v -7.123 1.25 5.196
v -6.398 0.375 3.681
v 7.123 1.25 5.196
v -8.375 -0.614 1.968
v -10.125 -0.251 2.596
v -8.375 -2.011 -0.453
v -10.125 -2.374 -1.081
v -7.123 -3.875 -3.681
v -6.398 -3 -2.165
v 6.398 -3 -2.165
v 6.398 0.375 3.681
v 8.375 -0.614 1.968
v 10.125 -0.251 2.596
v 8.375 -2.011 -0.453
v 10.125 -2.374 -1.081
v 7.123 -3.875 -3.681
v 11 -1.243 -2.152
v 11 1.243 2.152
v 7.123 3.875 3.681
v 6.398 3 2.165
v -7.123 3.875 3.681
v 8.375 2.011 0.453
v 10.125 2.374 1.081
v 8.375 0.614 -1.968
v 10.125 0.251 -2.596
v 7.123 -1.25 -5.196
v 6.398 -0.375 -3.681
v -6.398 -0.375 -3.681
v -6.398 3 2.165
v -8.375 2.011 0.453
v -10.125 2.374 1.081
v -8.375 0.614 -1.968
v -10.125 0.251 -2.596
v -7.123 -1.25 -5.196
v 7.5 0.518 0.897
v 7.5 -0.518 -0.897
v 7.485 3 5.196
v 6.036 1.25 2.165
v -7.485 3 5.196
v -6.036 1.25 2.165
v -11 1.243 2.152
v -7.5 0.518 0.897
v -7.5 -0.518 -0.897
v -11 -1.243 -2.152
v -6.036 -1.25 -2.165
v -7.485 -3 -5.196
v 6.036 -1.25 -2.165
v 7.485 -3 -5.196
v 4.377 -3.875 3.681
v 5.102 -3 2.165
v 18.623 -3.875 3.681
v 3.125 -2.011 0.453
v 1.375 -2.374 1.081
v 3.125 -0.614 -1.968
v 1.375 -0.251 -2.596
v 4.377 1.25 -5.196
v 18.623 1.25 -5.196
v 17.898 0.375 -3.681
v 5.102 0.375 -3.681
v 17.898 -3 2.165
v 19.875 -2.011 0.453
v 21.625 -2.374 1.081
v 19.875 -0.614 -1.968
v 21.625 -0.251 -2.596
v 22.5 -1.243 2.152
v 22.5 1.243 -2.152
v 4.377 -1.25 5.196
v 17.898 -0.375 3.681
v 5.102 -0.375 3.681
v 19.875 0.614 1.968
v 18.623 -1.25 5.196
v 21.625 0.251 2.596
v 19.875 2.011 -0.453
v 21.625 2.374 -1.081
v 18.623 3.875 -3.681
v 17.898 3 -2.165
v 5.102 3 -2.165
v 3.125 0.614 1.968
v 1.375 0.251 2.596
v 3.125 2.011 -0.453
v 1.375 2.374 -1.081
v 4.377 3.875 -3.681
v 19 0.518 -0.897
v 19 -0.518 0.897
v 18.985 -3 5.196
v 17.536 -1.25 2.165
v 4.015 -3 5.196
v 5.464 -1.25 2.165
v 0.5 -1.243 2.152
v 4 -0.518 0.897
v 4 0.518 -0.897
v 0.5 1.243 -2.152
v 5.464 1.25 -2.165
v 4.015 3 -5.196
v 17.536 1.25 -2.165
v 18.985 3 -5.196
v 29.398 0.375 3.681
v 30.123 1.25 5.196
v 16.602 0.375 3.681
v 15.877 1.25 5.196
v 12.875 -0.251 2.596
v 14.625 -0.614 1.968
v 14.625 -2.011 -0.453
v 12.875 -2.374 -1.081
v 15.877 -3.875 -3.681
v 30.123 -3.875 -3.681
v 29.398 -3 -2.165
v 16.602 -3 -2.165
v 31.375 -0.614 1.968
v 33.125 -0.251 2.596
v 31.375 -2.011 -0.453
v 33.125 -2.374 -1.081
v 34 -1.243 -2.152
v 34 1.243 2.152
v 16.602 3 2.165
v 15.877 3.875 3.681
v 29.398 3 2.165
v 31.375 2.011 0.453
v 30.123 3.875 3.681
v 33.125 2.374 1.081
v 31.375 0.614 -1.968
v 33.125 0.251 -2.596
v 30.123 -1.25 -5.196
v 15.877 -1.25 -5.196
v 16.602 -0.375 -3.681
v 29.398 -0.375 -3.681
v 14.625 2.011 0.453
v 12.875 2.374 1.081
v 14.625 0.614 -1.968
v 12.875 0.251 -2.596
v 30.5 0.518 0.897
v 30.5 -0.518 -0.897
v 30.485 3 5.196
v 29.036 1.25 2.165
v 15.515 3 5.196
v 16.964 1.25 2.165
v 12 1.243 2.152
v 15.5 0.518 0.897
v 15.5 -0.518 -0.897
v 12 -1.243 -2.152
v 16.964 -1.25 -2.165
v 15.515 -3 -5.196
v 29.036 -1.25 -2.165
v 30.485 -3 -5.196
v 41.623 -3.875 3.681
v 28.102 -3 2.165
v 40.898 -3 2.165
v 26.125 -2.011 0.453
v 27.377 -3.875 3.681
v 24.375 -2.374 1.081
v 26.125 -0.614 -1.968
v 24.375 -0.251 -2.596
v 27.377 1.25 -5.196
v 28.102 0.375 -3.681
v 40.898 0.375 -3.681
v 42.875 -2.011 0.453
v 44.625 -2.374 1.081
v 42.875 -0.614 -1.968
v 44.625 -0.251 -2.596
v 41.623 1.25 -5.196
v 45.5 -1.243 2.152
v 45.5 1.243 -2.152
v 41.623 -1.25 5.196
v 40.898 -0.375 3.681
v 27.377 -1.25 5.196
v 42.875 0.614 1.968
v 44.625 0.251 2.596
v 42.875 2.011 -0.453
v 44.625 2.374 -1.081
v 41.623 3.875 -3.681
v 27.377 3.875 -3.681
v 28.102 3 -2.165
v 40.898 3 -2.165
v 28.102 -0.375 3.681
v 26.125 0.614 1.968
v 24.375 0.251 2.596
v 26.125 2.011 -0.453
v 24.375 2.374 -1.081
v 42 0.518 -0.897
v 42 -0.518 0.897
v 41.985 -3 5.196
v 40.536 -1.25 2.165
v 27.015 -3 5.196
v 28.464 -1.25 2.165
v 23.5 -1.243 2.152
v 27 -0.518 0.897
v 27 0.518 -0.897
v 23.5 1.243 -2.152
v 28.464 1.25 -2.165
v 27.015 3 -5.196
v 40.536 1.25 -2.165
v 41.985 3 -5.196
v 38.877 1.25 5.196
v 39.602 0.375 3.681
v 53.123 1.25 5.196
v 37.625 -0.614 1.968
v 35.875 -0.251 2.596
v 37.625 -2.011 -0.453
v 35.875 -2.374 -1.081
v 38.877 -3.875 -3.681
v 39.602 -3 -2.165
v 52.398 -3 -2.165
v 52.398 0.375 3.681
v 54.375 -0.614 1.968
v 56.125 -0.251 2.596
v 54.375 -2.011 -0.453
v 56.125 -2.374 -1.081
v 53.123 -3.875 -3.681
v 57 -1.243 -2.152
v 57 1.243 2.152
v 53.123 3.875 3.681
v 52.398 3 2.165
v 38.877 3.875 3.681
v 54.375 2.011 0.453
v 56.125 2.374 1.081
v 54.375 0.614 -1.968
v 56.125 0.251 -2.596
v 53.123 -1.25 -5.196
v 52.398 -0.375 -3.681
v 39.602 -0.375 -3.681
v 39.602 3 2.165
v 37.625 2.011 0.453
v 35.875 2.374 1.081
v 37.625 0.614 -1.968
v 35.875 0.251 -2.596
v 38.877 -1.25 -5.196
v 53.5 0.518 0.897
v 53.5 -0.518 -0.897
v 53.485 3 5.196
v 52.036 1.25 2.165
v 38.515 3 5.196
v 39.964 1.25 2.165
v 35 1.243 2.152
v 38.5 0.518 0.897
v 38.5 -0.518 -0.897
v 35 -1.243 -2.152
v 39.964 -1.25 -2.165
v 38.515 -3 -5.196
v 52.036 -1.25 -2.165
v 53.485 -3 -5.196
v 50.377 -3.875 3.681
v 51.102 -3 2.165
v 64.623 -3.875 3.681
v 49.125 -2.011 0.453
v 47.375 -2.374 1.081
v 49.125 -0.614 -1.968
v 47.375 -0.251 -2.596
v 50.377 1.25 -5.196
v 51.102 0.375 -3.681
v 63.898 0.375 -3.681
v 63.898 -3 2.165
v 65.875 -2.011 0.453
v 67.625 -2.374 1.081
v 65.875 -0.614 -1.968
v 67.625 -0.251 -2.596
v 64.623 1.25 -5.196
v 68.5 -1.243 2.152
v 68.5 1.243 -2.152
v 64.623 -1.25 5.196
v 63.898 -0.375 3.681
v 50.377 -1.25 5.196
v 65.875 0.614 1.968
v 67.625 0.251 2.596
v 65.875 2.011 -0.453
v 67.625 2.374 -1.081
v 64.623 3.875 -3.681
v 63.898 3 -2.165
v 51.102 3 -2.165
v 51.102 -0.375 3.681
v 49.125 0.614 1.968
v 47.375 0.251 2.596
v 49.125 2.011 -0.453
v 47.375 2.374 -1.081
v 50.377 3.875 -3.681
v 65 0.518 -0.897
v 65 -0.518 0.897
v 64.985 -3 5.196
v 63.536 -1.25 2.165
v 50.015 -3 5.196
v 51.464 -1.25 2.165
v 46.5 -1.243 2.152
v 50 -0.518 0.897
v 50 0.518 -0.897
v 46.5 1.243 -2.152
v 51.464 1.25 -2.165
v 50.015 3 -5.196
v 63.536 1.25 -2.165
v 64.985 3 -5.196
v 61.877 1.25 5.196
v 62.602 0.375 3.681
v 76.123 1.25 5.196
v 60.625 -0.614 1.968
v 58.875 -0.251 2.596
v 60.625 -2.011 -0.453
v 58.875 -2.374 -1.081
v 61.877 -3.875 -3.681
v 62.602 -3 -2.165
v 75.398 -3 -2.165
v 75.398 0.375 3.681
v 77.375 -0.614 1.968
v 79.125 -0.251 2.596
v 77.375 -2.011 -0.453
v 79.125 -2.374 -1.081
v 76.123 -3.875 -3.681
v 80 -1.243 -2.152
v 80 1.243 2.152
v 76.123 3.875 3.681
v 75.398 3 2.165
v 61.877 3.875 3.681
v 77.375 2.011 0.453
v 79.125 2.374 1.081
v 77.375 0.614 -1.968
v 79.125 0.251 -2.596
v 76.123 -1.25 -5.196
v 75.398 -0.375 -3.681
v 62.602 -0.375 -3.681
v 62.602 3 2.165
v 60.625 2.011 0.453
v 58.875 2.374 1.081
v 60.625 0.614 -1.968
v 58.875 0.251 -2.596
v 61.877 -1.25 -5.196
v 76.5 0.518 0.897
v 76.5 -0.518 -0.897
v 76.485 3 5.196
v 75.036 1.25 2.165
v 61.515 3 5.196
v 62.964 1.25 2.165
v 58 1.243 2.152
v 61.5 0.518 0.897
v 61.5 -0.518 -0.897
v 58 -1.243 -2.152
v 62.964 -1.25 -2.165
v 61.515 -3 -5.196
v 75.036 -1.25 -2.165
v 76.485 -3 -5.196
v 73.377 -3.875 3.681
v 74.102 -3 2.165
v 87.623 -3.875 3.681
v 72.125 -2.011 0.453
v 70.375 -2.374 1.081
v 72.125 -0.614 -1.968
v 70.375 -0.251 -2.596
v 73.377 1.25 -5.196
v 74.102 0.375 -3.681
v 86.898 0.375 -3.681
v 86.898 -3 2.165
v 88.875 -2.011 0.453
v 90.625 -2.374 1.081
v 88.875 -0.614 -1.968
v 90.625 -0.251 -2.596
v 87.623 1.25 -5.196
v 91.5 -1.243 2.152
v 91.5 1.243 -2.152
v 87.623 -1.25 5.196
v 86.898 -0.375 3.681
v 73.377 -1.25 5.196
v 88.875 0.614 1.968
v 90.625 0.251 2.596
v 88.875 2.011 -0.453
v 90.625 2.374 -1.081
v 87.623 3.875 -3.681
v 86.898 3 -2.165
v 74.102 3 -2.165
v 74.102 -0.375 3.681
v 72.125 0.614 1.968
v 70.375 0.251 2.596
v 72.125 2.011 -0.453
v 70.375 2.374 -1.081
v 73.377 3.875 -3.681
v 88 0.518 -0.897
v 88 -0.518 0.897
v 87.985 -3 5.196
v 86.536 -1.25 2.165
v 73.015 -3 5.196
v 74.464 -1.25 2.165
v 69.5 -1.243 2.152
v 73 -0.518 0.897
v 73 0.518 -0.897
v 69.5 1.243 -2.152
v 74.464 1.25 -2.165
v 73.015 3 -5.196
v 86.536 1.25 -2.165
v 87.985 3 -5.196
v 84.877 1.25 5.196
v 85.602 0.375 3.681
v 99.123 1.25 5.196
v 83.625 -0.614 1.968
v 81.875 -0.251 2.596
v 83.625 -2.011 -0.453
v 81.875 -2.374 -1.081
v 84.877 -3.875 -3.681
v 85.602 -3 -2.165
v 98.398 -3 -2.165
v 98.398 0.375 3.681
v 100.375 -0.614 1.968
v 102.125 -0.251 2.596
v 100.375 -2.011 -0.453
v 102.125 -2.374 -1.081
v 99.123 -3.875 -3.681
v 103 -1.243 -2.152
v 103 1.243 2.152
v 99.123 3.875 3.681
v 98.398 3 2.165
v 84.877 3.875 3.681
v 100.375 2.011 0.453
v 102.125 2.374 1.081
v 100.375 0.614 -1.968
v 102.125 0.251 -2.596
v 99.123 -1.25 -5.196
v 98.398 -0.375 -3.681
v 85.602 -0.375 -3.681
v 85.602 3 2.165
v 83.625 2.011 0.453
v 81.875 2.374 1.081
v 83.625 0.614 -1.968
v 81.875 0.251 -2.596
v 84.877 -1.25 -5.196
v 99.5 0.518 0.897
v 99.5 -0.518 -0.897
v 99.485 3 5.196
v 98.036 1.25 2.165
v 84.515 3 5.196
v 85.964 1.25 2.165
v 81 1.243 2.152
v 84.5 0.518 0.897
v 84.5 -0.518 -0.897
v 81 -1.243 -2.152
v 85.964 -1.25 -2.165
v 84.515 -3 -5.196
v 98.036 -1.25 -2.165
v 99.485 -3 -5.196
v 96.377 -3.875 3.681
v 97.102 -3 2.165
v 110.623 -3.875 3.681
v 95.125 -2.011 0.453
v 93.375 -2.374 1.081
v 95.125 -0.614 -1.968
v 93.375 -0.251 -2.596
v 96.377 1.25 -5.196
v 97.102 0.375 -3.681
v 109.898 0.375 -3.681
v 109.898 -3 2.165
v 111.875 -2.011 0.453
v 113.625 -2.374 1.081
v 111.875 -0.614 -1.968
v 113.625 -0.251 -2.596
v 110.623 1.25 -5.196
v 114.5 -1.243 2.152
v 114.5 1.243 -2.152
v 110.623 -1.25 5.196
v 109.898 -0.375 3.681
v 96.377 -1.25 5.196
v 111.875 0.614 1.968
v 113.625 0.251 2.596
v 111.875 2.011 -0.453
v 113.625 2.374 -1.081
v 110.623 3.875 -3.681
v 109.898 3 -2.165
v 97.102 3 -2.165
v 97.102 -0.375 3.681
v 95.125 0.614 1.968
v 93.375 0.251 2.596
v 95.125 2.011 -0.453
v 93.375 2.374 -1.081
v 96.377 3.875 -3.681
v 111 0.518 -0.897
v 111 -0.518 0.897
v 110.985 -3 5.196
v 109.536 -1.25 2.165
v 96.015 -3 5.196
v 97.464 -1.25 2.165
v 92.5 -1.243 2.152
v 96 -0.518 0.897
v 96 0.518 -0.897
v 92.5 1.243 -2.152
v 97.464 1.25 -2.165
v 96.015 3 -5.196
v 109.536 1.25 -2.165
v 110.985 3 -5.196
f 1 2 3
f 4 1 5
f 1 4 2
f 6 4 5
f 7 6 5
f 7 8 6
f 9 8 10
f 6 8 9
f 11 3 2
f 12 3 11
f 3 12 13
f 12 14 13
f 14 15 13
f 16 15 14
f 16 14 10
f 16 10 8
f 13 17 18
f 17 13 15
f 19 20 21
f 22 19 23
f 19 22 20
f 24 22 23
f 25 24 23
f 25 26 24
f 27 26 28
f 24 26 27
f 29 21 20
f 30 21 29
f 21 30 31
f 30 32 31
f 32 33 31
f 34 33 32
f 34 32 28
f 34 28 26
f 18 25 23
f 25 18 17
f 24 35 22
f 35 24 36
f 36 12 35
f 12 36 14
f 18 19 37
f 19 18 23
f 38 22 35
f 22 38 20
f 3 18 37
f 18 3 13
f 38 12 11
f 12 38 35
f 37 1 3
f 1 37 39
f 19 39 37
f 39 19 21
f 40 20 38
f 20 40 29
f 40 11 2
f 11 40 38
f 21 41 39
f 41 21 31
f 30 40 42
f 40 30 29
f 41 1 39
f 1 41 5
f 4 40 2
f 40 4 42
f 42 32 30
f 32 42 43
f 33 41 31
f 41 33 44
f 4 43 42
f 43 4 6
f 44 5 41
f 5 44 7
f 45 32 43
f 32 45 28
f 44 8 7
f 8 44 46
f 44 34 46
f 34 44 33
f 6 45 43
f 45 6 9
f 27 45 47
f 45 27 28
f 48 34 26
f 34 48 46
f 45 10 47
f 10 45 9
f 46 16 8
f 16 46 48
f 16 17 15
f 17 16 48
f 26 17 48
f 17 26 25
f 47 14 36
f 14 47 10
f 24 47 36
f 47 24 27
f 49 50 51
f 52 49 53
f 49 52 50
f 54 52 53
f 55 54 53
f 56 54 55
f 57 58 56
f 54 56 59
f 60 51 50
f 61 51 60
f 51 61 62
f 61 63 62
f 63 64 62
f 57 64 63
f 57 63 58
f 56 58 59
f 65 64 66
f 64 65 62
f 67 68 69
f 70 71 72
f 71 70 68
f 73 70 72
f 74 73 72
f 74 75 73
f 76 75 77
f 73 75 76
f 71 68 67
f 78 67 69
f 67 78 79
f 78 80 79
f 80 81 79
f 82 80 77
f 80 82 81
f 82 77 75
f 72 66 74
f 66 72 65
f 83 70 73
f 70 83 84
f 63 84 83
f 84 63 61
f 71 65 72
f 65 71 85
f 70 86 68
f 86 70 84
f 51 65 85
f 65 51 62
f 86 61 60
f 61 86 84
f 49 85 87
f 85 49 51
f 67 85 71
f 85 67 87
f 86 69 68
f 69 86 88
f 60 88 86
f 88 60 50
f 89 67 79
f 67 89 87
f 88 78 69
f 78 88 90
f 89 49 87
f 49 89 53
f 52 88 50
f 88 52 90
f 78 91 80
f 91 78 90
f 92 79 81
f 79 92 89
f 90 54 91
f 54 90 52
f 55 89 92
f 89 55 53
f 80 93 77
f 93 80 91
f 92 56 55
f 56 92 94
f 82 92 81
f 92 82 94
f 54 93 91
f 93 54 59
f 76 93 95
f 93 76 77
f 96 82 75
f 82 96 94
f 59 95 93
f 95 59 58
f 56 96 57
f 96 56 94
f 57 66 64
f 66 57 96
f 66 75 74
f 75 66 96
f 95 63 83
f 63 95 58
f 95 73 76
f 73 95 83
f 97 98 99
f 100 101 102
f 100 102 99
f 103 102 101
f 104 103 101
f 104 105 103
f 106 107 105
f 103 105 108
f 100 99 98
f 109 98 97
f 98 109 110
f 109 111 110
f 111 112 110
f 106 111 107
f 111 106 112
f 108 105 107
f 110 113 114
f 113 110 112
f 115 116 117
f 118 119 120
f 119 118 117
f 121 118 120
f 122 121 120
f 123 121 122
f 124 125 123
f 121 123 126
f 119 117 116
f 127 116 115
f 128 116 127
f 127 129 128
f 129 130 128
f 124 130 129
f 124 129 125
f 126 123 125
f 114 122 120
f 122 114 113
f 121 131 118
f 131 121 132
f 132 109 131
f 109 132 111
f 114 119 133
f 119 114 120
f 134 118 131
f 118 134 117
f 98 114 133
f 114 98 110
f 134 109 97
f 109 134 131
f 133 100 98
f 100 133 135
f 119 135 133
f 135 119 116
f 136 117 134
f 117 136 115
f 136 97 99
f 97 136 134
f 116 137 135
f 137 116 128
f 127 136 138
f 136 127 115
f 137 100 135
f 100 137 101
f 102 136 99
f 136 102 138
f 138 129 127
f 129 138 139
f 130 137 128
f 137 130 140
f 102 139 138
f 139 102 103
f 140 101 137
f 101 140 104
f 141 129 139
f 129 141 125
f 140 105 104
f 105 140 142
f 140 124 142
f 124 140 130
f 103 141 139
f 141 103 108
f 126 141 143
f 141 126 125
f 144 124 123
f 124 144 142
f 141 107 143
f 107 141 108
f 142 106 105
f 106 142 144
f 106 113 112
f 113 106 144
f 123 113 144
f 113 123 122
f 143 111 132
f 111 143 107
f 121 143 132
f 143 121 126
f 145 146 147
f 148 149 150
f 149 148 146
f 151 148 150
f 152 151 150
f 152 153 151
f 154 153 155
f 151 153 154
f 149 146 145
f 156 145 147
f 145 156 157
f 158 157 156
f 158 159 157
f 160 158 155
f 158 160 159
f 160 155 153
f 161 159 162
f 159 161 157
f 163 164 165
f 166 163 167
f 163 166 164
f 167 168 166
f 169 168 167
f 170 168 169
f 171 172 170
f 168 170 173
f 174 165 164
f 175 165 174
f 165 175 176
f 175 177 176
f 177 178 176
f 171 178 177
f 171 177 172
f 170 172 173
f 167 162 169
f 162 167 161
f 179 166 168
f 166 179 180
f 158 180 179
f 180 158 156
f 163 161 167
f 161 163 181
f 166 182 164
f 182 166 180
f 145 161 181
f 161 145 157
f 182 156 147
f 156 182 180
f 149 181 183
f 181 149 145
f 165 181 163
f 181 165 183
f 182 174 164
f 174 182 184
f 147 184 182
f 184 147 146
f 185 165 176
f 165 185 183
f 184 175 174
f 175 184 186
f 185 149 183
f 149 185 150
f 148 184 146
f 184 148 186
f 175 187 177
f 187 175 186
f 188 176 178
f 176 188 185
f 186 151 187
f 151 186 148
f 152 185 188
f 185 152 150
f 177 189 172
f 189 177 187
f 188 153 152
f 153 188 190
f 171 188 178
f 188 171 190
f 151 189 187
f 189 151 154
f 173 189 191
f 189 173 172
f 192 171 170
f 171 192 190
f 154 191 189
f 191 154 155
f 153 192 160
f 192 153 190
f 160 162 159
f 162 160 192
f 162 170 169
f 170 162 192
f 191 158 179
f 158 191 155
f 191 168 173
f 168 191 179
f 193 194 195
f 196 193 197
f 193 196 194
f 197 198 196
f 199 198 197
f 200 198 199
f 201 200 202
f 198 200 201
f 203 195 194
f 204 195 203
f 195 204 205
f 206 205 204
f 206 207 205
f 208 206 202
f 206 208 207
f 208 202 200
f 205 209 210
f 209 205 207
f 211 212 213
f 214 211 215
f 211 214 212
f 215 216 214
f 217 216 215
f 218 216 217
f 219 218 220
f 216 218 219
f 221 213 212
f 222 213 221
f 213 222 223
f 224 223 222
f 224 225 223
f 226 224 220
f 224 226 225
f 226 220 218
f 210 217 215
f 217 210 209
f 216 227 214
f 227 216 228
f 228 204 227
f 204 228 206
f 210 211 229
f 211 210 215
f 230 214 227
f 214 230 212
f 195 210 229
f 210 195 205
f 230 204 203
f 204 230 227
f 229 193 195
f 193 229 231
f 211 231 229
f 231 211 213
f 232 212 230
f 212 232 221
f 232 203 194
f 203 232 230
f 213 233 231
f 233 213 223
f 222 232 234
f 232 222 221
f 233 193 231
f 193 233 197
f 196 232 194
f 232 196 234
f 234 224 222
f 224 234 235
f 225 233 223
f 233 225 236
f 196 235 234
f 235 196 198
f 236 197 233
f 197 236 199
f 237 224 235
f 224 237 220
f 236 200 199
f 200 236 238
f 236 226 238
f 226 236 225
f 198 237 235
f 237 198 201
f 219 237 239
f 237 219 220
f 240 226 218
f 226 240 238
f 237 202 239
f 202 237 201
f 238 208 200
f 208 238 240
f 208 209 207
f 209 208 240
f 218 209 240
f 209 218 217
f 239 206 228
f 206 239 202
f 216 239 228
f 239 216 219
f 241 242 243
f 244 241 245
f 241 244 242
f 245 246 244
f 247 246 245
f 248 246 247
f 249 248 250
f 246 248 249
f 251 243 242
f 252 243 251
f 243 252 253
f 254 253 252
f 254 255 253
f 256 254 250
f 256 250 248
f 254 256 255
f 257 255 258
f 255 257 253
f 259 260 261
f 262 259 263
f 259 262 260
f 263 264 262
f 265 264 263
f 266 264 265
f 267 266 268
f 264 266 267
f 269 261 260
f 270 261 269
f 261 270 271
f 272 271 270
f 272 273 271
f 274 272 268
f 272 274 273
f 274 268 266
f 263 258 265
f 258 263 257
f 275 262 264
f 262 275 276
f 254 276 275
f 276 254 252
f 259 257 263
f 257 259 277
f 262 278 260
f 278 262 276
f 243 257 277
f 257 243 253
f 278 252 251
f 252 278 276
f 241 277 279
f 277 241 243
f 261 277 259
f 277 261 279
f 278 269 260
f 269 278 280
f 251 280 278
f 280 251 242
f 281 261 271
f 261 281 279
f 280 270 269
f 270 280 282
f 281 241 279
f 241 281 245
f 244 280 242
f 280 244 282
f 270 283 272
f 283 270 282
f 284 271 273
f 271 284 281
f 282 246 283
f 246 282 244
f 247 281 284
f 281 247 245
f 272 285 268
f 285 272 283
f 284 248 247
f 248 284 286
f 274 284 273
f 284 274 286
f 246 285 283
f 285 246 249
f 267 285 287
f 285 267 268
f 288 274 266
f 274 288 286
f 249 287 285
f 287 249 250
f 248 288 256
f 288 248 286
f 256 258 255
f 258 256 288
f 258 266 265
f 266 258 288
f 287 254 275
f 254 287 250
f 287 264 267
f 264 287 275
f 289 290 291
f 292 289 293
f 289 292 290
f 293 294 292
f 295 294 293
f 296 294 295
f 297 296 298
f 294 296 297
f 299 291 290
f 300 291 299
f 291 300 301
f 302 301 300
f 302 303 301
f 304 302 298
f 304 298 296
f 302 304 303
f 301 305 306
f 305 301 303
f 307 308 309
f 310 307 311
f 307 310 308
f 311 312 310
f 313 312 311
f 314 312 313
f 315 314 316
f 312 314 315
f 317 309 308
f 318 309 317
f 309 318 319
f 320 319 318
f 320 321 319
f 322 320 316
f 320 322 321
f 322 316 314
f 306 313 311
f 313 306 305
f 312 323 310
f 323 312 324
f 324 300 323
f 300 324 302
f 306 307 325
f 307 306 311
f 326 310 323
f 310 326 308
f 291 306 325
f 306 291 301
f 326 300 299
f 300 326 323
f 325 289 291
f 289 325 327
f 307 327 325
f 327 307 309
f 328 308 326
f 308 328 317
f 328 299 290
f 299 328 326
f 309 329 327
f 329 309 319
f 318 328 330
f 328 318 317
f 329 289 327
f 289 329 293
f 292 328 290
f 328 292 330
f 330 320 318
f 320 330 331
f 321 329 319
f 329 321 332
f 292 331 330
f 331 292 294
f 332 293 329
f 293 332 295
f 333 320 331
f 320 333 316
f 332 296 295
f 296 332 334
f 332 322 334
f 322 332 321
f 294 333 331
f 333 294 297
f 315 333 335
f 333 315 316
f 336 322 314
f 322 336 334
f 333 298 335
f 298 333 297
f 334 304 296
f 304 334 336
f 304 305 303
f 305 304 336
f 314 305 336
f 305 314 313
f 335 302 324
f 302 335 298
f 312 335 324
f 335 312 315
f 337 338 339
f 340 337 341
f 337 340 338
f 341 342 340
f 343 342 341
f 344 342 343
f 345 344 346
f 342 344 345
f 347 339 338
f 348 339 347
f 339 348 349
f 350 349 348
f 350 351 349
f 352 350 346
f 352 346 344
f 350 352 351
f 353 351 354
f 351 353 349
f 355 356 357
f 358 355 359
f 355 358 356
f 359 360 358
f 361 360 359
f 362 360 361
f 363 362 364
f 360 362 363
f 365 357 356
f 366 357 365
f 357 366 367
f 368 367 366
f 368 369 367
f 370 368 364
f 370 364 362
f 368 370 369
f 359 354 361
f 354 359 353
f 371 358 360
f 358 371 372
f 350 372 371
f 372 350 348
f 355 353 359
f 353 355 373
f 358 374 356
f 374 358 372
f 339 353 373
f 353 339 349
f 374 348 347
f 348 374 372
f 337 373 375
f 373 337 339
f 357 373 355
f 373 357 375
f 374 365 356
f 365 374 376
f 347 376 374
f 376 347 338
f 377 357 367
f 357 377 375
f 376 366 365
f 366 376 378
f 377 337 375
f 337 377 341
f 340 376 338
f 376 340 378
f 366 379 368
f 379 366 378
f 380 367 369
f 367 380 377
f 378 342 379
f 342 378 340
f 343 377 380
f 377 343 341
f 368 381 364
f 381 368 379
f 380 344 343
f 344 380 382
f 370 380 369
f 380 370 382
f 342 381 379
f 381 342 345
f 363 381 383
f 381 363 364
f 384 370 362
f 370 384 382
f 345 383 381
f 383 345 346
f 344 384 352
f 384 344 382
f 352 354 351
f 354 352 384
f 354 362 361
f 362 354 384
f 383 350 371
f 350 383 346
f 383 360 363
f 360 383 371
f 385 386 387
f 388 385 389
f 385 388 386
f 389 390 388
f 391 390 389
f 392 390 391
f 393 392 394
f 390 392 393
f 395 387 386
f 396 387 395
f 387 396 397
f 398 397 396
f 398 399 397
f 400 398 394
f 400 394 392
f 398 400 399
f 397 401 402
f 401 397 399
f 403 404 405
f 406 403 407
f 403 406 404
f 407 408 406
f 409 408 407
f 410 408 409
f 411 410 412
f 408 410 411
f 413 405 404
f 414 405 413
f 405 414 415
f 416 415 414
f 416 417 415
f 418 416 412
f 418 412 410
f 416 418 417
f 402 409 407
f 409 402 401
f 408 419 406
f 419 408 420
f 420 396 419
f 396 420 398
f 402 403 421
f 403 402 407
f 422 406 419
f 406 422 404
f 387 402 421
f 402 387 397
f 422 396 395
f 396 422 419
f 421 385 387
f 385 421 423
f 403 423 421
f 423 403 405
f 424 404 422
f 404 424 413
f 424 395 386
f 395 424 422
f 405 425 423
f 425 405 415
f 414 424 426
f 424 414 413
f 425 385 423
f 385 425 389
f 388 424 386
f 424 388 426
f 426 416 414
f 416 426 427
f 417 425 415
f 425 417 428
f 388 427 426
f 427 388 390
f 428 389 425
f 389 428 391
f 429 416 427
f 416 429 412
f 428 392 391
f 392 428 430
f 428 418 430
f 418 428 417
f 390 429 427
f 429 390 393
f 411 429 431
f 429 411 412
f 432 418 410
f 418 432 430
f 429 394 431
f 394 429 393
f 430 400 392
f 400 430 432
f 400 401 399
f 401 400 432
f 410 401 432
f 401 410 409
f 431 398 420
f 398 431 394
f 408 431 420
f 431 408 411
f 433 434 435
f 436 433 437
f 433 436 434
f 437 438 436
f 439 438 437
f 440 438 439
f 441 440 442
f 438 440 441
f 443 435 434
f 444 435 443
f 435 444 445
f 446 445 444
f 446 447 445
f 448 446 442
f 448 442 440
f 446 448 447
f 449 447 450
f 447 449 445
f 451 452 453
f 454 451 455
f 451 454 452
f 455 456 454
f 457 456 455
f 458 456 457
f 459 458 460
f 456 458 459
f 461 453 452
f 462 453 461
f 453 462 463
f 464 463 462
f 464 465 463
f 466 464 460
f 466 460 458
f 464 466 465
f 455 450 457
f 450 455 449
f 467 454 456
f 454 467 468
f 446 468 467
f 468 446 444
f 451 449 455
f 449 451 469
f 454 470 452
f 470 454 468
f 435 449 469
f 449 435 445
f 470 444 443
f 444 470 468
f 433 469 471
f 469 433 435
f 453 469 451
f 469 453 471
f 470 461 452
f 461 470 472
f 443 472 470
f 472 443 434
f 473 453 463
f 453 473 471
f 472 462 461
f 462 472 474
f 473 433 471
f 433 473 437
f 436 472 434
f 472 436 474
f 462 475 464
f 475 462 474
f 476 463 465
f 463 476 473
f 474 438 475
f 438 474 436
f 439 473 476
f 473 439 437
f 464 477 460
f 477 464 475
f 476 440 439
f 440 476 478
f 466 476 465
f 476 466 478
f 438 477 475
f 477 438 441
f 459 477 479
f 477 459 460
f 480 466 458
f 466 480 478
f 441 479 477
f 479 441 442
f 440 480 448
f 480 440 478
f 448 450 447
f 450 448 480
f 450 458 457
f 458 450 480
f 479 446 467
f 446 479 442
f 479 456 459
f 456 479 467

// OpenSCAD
/**************
Chain generator
(http://www.thingiverse.com/thing:28405)

Author: Stefan Langemark

Generates open or closed chains with configurable
dimensions. Print without support.

Open chains (two ends):
straight_chain()
spiral_chain()

Closed chains (no end):
circular_chain()

Common parameters:
l - length of link
d - width of link
t - thickness of material
links - number of links in chain
The length of the chain when stretched is links*(l-2*t)

The spiral and circular chains need a bit wider chains
than the straight chain to make room for the curvature.

***************/


/**************
 Select output here!
***************/

// Shape of chain
type = "straight"; // [straight,circular,spiral]

// Number of links. Needs to be an even number for circular type!
links = 10; 

// Length of link
l = 22;

// Width of link (increase to 15 for circular or spiral type)
d = 12;

// Diameter of cross section
t = 3.5;

// Initial radius for spiral type
r0 = 20;

// Increase of radius per turn for spiral type
pitch = 12;

if (type == "straight") straight_chain(links, l,d,t);
if (type == "circular") circular_chain(links, l,d,t);
if (type == "spiral") spiral_chain(links, l,d,t,r0,pitch);

/*
Open chain in a spiral.
Additional parameters:
r0 - initial radius (mm).
pitch - increase of radius per turn (mm/turn).
*/
module spiral_chain(links=30,l=22,d=15,t=3.5,r0=20,pitch=12)
{
	spacing=l/2+1;
	for (i=[0:links-1])
	assign(angle = inv_arch_len(spacing*i,r0,pitch),
		angle2 = inv_arch_len(spacing*(i+1),r0,pitch))
	assign(p = arch_spiral(angle,pitch),
		p2 = arch_spiral(angle2,pitch))
	{
		translate(p)
		rotate([0,0,atan2(p2[1]-p[1],p2[0]-p[0])])
		translate([spacing/2,0,0])
		rotate([60+60*(i%2),0,0])
		link(l,d,t);
	}
}

// Straight chain segment
module straight_chain(links=5, l = 22, d = 12, t = 3.5)
{
	spacing=l/2+.5;
	for (i=[0:links-1]) {
		translate([i*spacing,0,0])rotate([60+60*(i%2),0,0])link(l,d,t);
	}
}

// Closed chain in a circle
module circular_chain(links=14, l = 22, d = 15, t = 3.5)
{
	a = 360/links;
	spacing=l/2+1; // tweak this to make chains with few links
	r=spacing/2/tan(a/2);
	echo("radius",r);
	for (i=[0:links-1]) {
		rotate([0,0,i*a])translate([0,-r,0])rotate([60+60*(i%2),0,0])link(l,d,t);
	}
}

// Single chain link. Centered, with l,d,t in axes x,y,z, respectively.
module link(l,d,t)
{
	union() {
	for (a=[0:7])
	{
		assign(
			off1 = (l-d)/2*((a-.5>2&&a-.5<6)?-1:1),
			off2 = (l-d)/2*((a+.5>2&&a+.5<6)?-1:1))
		{
			intersection() {
				translate([0,0,-t/2])
				pie((a-.5)*360/8,
					(a+.5)*360/8,l,t,
					[off1,0],[off2,0]);
				translate([(off1+off2)/2,0,0])
				rotate([0,0,a*360/8])
				rotate([-90,0,0])
				translate([(d-t)/2,0,-l/2])
				cylinder($fn=6,r=t/2,h=l);
			}
		}
	}
}
}

function pol(r,a) = [r*cos(a),r*sin(a)];
module pie(a1,a2,r,h,o1,o2)
{
	if (o1==o2) {
	linear_extrude(height=h)
		polygon([o1,o1+pol(r,a1),o1+pol(r,a2)]);
	} else {
	linear_extrude(height=h)
		polygon([o1,o1+pol(r,a1),o2+pol(r,a2),o2]);
	}
}

// Approximate angle of archimedes spiral of length len (mm) from radius r0, given pitch a (mm/turn).
function inv_arch_len(len,r0,a) = 180/3.1416*sqrt(len*2/(a/2/3.1416)+(r0*2*3.1416/a)*(r0*2*3.1416/a));

// Point on archimedes spiral at angle given pitch a (mm/turn).
function arch_spiral(angle,a) = [a*angle/360*cos(angle),a*angle/360*sin(angle),0];
